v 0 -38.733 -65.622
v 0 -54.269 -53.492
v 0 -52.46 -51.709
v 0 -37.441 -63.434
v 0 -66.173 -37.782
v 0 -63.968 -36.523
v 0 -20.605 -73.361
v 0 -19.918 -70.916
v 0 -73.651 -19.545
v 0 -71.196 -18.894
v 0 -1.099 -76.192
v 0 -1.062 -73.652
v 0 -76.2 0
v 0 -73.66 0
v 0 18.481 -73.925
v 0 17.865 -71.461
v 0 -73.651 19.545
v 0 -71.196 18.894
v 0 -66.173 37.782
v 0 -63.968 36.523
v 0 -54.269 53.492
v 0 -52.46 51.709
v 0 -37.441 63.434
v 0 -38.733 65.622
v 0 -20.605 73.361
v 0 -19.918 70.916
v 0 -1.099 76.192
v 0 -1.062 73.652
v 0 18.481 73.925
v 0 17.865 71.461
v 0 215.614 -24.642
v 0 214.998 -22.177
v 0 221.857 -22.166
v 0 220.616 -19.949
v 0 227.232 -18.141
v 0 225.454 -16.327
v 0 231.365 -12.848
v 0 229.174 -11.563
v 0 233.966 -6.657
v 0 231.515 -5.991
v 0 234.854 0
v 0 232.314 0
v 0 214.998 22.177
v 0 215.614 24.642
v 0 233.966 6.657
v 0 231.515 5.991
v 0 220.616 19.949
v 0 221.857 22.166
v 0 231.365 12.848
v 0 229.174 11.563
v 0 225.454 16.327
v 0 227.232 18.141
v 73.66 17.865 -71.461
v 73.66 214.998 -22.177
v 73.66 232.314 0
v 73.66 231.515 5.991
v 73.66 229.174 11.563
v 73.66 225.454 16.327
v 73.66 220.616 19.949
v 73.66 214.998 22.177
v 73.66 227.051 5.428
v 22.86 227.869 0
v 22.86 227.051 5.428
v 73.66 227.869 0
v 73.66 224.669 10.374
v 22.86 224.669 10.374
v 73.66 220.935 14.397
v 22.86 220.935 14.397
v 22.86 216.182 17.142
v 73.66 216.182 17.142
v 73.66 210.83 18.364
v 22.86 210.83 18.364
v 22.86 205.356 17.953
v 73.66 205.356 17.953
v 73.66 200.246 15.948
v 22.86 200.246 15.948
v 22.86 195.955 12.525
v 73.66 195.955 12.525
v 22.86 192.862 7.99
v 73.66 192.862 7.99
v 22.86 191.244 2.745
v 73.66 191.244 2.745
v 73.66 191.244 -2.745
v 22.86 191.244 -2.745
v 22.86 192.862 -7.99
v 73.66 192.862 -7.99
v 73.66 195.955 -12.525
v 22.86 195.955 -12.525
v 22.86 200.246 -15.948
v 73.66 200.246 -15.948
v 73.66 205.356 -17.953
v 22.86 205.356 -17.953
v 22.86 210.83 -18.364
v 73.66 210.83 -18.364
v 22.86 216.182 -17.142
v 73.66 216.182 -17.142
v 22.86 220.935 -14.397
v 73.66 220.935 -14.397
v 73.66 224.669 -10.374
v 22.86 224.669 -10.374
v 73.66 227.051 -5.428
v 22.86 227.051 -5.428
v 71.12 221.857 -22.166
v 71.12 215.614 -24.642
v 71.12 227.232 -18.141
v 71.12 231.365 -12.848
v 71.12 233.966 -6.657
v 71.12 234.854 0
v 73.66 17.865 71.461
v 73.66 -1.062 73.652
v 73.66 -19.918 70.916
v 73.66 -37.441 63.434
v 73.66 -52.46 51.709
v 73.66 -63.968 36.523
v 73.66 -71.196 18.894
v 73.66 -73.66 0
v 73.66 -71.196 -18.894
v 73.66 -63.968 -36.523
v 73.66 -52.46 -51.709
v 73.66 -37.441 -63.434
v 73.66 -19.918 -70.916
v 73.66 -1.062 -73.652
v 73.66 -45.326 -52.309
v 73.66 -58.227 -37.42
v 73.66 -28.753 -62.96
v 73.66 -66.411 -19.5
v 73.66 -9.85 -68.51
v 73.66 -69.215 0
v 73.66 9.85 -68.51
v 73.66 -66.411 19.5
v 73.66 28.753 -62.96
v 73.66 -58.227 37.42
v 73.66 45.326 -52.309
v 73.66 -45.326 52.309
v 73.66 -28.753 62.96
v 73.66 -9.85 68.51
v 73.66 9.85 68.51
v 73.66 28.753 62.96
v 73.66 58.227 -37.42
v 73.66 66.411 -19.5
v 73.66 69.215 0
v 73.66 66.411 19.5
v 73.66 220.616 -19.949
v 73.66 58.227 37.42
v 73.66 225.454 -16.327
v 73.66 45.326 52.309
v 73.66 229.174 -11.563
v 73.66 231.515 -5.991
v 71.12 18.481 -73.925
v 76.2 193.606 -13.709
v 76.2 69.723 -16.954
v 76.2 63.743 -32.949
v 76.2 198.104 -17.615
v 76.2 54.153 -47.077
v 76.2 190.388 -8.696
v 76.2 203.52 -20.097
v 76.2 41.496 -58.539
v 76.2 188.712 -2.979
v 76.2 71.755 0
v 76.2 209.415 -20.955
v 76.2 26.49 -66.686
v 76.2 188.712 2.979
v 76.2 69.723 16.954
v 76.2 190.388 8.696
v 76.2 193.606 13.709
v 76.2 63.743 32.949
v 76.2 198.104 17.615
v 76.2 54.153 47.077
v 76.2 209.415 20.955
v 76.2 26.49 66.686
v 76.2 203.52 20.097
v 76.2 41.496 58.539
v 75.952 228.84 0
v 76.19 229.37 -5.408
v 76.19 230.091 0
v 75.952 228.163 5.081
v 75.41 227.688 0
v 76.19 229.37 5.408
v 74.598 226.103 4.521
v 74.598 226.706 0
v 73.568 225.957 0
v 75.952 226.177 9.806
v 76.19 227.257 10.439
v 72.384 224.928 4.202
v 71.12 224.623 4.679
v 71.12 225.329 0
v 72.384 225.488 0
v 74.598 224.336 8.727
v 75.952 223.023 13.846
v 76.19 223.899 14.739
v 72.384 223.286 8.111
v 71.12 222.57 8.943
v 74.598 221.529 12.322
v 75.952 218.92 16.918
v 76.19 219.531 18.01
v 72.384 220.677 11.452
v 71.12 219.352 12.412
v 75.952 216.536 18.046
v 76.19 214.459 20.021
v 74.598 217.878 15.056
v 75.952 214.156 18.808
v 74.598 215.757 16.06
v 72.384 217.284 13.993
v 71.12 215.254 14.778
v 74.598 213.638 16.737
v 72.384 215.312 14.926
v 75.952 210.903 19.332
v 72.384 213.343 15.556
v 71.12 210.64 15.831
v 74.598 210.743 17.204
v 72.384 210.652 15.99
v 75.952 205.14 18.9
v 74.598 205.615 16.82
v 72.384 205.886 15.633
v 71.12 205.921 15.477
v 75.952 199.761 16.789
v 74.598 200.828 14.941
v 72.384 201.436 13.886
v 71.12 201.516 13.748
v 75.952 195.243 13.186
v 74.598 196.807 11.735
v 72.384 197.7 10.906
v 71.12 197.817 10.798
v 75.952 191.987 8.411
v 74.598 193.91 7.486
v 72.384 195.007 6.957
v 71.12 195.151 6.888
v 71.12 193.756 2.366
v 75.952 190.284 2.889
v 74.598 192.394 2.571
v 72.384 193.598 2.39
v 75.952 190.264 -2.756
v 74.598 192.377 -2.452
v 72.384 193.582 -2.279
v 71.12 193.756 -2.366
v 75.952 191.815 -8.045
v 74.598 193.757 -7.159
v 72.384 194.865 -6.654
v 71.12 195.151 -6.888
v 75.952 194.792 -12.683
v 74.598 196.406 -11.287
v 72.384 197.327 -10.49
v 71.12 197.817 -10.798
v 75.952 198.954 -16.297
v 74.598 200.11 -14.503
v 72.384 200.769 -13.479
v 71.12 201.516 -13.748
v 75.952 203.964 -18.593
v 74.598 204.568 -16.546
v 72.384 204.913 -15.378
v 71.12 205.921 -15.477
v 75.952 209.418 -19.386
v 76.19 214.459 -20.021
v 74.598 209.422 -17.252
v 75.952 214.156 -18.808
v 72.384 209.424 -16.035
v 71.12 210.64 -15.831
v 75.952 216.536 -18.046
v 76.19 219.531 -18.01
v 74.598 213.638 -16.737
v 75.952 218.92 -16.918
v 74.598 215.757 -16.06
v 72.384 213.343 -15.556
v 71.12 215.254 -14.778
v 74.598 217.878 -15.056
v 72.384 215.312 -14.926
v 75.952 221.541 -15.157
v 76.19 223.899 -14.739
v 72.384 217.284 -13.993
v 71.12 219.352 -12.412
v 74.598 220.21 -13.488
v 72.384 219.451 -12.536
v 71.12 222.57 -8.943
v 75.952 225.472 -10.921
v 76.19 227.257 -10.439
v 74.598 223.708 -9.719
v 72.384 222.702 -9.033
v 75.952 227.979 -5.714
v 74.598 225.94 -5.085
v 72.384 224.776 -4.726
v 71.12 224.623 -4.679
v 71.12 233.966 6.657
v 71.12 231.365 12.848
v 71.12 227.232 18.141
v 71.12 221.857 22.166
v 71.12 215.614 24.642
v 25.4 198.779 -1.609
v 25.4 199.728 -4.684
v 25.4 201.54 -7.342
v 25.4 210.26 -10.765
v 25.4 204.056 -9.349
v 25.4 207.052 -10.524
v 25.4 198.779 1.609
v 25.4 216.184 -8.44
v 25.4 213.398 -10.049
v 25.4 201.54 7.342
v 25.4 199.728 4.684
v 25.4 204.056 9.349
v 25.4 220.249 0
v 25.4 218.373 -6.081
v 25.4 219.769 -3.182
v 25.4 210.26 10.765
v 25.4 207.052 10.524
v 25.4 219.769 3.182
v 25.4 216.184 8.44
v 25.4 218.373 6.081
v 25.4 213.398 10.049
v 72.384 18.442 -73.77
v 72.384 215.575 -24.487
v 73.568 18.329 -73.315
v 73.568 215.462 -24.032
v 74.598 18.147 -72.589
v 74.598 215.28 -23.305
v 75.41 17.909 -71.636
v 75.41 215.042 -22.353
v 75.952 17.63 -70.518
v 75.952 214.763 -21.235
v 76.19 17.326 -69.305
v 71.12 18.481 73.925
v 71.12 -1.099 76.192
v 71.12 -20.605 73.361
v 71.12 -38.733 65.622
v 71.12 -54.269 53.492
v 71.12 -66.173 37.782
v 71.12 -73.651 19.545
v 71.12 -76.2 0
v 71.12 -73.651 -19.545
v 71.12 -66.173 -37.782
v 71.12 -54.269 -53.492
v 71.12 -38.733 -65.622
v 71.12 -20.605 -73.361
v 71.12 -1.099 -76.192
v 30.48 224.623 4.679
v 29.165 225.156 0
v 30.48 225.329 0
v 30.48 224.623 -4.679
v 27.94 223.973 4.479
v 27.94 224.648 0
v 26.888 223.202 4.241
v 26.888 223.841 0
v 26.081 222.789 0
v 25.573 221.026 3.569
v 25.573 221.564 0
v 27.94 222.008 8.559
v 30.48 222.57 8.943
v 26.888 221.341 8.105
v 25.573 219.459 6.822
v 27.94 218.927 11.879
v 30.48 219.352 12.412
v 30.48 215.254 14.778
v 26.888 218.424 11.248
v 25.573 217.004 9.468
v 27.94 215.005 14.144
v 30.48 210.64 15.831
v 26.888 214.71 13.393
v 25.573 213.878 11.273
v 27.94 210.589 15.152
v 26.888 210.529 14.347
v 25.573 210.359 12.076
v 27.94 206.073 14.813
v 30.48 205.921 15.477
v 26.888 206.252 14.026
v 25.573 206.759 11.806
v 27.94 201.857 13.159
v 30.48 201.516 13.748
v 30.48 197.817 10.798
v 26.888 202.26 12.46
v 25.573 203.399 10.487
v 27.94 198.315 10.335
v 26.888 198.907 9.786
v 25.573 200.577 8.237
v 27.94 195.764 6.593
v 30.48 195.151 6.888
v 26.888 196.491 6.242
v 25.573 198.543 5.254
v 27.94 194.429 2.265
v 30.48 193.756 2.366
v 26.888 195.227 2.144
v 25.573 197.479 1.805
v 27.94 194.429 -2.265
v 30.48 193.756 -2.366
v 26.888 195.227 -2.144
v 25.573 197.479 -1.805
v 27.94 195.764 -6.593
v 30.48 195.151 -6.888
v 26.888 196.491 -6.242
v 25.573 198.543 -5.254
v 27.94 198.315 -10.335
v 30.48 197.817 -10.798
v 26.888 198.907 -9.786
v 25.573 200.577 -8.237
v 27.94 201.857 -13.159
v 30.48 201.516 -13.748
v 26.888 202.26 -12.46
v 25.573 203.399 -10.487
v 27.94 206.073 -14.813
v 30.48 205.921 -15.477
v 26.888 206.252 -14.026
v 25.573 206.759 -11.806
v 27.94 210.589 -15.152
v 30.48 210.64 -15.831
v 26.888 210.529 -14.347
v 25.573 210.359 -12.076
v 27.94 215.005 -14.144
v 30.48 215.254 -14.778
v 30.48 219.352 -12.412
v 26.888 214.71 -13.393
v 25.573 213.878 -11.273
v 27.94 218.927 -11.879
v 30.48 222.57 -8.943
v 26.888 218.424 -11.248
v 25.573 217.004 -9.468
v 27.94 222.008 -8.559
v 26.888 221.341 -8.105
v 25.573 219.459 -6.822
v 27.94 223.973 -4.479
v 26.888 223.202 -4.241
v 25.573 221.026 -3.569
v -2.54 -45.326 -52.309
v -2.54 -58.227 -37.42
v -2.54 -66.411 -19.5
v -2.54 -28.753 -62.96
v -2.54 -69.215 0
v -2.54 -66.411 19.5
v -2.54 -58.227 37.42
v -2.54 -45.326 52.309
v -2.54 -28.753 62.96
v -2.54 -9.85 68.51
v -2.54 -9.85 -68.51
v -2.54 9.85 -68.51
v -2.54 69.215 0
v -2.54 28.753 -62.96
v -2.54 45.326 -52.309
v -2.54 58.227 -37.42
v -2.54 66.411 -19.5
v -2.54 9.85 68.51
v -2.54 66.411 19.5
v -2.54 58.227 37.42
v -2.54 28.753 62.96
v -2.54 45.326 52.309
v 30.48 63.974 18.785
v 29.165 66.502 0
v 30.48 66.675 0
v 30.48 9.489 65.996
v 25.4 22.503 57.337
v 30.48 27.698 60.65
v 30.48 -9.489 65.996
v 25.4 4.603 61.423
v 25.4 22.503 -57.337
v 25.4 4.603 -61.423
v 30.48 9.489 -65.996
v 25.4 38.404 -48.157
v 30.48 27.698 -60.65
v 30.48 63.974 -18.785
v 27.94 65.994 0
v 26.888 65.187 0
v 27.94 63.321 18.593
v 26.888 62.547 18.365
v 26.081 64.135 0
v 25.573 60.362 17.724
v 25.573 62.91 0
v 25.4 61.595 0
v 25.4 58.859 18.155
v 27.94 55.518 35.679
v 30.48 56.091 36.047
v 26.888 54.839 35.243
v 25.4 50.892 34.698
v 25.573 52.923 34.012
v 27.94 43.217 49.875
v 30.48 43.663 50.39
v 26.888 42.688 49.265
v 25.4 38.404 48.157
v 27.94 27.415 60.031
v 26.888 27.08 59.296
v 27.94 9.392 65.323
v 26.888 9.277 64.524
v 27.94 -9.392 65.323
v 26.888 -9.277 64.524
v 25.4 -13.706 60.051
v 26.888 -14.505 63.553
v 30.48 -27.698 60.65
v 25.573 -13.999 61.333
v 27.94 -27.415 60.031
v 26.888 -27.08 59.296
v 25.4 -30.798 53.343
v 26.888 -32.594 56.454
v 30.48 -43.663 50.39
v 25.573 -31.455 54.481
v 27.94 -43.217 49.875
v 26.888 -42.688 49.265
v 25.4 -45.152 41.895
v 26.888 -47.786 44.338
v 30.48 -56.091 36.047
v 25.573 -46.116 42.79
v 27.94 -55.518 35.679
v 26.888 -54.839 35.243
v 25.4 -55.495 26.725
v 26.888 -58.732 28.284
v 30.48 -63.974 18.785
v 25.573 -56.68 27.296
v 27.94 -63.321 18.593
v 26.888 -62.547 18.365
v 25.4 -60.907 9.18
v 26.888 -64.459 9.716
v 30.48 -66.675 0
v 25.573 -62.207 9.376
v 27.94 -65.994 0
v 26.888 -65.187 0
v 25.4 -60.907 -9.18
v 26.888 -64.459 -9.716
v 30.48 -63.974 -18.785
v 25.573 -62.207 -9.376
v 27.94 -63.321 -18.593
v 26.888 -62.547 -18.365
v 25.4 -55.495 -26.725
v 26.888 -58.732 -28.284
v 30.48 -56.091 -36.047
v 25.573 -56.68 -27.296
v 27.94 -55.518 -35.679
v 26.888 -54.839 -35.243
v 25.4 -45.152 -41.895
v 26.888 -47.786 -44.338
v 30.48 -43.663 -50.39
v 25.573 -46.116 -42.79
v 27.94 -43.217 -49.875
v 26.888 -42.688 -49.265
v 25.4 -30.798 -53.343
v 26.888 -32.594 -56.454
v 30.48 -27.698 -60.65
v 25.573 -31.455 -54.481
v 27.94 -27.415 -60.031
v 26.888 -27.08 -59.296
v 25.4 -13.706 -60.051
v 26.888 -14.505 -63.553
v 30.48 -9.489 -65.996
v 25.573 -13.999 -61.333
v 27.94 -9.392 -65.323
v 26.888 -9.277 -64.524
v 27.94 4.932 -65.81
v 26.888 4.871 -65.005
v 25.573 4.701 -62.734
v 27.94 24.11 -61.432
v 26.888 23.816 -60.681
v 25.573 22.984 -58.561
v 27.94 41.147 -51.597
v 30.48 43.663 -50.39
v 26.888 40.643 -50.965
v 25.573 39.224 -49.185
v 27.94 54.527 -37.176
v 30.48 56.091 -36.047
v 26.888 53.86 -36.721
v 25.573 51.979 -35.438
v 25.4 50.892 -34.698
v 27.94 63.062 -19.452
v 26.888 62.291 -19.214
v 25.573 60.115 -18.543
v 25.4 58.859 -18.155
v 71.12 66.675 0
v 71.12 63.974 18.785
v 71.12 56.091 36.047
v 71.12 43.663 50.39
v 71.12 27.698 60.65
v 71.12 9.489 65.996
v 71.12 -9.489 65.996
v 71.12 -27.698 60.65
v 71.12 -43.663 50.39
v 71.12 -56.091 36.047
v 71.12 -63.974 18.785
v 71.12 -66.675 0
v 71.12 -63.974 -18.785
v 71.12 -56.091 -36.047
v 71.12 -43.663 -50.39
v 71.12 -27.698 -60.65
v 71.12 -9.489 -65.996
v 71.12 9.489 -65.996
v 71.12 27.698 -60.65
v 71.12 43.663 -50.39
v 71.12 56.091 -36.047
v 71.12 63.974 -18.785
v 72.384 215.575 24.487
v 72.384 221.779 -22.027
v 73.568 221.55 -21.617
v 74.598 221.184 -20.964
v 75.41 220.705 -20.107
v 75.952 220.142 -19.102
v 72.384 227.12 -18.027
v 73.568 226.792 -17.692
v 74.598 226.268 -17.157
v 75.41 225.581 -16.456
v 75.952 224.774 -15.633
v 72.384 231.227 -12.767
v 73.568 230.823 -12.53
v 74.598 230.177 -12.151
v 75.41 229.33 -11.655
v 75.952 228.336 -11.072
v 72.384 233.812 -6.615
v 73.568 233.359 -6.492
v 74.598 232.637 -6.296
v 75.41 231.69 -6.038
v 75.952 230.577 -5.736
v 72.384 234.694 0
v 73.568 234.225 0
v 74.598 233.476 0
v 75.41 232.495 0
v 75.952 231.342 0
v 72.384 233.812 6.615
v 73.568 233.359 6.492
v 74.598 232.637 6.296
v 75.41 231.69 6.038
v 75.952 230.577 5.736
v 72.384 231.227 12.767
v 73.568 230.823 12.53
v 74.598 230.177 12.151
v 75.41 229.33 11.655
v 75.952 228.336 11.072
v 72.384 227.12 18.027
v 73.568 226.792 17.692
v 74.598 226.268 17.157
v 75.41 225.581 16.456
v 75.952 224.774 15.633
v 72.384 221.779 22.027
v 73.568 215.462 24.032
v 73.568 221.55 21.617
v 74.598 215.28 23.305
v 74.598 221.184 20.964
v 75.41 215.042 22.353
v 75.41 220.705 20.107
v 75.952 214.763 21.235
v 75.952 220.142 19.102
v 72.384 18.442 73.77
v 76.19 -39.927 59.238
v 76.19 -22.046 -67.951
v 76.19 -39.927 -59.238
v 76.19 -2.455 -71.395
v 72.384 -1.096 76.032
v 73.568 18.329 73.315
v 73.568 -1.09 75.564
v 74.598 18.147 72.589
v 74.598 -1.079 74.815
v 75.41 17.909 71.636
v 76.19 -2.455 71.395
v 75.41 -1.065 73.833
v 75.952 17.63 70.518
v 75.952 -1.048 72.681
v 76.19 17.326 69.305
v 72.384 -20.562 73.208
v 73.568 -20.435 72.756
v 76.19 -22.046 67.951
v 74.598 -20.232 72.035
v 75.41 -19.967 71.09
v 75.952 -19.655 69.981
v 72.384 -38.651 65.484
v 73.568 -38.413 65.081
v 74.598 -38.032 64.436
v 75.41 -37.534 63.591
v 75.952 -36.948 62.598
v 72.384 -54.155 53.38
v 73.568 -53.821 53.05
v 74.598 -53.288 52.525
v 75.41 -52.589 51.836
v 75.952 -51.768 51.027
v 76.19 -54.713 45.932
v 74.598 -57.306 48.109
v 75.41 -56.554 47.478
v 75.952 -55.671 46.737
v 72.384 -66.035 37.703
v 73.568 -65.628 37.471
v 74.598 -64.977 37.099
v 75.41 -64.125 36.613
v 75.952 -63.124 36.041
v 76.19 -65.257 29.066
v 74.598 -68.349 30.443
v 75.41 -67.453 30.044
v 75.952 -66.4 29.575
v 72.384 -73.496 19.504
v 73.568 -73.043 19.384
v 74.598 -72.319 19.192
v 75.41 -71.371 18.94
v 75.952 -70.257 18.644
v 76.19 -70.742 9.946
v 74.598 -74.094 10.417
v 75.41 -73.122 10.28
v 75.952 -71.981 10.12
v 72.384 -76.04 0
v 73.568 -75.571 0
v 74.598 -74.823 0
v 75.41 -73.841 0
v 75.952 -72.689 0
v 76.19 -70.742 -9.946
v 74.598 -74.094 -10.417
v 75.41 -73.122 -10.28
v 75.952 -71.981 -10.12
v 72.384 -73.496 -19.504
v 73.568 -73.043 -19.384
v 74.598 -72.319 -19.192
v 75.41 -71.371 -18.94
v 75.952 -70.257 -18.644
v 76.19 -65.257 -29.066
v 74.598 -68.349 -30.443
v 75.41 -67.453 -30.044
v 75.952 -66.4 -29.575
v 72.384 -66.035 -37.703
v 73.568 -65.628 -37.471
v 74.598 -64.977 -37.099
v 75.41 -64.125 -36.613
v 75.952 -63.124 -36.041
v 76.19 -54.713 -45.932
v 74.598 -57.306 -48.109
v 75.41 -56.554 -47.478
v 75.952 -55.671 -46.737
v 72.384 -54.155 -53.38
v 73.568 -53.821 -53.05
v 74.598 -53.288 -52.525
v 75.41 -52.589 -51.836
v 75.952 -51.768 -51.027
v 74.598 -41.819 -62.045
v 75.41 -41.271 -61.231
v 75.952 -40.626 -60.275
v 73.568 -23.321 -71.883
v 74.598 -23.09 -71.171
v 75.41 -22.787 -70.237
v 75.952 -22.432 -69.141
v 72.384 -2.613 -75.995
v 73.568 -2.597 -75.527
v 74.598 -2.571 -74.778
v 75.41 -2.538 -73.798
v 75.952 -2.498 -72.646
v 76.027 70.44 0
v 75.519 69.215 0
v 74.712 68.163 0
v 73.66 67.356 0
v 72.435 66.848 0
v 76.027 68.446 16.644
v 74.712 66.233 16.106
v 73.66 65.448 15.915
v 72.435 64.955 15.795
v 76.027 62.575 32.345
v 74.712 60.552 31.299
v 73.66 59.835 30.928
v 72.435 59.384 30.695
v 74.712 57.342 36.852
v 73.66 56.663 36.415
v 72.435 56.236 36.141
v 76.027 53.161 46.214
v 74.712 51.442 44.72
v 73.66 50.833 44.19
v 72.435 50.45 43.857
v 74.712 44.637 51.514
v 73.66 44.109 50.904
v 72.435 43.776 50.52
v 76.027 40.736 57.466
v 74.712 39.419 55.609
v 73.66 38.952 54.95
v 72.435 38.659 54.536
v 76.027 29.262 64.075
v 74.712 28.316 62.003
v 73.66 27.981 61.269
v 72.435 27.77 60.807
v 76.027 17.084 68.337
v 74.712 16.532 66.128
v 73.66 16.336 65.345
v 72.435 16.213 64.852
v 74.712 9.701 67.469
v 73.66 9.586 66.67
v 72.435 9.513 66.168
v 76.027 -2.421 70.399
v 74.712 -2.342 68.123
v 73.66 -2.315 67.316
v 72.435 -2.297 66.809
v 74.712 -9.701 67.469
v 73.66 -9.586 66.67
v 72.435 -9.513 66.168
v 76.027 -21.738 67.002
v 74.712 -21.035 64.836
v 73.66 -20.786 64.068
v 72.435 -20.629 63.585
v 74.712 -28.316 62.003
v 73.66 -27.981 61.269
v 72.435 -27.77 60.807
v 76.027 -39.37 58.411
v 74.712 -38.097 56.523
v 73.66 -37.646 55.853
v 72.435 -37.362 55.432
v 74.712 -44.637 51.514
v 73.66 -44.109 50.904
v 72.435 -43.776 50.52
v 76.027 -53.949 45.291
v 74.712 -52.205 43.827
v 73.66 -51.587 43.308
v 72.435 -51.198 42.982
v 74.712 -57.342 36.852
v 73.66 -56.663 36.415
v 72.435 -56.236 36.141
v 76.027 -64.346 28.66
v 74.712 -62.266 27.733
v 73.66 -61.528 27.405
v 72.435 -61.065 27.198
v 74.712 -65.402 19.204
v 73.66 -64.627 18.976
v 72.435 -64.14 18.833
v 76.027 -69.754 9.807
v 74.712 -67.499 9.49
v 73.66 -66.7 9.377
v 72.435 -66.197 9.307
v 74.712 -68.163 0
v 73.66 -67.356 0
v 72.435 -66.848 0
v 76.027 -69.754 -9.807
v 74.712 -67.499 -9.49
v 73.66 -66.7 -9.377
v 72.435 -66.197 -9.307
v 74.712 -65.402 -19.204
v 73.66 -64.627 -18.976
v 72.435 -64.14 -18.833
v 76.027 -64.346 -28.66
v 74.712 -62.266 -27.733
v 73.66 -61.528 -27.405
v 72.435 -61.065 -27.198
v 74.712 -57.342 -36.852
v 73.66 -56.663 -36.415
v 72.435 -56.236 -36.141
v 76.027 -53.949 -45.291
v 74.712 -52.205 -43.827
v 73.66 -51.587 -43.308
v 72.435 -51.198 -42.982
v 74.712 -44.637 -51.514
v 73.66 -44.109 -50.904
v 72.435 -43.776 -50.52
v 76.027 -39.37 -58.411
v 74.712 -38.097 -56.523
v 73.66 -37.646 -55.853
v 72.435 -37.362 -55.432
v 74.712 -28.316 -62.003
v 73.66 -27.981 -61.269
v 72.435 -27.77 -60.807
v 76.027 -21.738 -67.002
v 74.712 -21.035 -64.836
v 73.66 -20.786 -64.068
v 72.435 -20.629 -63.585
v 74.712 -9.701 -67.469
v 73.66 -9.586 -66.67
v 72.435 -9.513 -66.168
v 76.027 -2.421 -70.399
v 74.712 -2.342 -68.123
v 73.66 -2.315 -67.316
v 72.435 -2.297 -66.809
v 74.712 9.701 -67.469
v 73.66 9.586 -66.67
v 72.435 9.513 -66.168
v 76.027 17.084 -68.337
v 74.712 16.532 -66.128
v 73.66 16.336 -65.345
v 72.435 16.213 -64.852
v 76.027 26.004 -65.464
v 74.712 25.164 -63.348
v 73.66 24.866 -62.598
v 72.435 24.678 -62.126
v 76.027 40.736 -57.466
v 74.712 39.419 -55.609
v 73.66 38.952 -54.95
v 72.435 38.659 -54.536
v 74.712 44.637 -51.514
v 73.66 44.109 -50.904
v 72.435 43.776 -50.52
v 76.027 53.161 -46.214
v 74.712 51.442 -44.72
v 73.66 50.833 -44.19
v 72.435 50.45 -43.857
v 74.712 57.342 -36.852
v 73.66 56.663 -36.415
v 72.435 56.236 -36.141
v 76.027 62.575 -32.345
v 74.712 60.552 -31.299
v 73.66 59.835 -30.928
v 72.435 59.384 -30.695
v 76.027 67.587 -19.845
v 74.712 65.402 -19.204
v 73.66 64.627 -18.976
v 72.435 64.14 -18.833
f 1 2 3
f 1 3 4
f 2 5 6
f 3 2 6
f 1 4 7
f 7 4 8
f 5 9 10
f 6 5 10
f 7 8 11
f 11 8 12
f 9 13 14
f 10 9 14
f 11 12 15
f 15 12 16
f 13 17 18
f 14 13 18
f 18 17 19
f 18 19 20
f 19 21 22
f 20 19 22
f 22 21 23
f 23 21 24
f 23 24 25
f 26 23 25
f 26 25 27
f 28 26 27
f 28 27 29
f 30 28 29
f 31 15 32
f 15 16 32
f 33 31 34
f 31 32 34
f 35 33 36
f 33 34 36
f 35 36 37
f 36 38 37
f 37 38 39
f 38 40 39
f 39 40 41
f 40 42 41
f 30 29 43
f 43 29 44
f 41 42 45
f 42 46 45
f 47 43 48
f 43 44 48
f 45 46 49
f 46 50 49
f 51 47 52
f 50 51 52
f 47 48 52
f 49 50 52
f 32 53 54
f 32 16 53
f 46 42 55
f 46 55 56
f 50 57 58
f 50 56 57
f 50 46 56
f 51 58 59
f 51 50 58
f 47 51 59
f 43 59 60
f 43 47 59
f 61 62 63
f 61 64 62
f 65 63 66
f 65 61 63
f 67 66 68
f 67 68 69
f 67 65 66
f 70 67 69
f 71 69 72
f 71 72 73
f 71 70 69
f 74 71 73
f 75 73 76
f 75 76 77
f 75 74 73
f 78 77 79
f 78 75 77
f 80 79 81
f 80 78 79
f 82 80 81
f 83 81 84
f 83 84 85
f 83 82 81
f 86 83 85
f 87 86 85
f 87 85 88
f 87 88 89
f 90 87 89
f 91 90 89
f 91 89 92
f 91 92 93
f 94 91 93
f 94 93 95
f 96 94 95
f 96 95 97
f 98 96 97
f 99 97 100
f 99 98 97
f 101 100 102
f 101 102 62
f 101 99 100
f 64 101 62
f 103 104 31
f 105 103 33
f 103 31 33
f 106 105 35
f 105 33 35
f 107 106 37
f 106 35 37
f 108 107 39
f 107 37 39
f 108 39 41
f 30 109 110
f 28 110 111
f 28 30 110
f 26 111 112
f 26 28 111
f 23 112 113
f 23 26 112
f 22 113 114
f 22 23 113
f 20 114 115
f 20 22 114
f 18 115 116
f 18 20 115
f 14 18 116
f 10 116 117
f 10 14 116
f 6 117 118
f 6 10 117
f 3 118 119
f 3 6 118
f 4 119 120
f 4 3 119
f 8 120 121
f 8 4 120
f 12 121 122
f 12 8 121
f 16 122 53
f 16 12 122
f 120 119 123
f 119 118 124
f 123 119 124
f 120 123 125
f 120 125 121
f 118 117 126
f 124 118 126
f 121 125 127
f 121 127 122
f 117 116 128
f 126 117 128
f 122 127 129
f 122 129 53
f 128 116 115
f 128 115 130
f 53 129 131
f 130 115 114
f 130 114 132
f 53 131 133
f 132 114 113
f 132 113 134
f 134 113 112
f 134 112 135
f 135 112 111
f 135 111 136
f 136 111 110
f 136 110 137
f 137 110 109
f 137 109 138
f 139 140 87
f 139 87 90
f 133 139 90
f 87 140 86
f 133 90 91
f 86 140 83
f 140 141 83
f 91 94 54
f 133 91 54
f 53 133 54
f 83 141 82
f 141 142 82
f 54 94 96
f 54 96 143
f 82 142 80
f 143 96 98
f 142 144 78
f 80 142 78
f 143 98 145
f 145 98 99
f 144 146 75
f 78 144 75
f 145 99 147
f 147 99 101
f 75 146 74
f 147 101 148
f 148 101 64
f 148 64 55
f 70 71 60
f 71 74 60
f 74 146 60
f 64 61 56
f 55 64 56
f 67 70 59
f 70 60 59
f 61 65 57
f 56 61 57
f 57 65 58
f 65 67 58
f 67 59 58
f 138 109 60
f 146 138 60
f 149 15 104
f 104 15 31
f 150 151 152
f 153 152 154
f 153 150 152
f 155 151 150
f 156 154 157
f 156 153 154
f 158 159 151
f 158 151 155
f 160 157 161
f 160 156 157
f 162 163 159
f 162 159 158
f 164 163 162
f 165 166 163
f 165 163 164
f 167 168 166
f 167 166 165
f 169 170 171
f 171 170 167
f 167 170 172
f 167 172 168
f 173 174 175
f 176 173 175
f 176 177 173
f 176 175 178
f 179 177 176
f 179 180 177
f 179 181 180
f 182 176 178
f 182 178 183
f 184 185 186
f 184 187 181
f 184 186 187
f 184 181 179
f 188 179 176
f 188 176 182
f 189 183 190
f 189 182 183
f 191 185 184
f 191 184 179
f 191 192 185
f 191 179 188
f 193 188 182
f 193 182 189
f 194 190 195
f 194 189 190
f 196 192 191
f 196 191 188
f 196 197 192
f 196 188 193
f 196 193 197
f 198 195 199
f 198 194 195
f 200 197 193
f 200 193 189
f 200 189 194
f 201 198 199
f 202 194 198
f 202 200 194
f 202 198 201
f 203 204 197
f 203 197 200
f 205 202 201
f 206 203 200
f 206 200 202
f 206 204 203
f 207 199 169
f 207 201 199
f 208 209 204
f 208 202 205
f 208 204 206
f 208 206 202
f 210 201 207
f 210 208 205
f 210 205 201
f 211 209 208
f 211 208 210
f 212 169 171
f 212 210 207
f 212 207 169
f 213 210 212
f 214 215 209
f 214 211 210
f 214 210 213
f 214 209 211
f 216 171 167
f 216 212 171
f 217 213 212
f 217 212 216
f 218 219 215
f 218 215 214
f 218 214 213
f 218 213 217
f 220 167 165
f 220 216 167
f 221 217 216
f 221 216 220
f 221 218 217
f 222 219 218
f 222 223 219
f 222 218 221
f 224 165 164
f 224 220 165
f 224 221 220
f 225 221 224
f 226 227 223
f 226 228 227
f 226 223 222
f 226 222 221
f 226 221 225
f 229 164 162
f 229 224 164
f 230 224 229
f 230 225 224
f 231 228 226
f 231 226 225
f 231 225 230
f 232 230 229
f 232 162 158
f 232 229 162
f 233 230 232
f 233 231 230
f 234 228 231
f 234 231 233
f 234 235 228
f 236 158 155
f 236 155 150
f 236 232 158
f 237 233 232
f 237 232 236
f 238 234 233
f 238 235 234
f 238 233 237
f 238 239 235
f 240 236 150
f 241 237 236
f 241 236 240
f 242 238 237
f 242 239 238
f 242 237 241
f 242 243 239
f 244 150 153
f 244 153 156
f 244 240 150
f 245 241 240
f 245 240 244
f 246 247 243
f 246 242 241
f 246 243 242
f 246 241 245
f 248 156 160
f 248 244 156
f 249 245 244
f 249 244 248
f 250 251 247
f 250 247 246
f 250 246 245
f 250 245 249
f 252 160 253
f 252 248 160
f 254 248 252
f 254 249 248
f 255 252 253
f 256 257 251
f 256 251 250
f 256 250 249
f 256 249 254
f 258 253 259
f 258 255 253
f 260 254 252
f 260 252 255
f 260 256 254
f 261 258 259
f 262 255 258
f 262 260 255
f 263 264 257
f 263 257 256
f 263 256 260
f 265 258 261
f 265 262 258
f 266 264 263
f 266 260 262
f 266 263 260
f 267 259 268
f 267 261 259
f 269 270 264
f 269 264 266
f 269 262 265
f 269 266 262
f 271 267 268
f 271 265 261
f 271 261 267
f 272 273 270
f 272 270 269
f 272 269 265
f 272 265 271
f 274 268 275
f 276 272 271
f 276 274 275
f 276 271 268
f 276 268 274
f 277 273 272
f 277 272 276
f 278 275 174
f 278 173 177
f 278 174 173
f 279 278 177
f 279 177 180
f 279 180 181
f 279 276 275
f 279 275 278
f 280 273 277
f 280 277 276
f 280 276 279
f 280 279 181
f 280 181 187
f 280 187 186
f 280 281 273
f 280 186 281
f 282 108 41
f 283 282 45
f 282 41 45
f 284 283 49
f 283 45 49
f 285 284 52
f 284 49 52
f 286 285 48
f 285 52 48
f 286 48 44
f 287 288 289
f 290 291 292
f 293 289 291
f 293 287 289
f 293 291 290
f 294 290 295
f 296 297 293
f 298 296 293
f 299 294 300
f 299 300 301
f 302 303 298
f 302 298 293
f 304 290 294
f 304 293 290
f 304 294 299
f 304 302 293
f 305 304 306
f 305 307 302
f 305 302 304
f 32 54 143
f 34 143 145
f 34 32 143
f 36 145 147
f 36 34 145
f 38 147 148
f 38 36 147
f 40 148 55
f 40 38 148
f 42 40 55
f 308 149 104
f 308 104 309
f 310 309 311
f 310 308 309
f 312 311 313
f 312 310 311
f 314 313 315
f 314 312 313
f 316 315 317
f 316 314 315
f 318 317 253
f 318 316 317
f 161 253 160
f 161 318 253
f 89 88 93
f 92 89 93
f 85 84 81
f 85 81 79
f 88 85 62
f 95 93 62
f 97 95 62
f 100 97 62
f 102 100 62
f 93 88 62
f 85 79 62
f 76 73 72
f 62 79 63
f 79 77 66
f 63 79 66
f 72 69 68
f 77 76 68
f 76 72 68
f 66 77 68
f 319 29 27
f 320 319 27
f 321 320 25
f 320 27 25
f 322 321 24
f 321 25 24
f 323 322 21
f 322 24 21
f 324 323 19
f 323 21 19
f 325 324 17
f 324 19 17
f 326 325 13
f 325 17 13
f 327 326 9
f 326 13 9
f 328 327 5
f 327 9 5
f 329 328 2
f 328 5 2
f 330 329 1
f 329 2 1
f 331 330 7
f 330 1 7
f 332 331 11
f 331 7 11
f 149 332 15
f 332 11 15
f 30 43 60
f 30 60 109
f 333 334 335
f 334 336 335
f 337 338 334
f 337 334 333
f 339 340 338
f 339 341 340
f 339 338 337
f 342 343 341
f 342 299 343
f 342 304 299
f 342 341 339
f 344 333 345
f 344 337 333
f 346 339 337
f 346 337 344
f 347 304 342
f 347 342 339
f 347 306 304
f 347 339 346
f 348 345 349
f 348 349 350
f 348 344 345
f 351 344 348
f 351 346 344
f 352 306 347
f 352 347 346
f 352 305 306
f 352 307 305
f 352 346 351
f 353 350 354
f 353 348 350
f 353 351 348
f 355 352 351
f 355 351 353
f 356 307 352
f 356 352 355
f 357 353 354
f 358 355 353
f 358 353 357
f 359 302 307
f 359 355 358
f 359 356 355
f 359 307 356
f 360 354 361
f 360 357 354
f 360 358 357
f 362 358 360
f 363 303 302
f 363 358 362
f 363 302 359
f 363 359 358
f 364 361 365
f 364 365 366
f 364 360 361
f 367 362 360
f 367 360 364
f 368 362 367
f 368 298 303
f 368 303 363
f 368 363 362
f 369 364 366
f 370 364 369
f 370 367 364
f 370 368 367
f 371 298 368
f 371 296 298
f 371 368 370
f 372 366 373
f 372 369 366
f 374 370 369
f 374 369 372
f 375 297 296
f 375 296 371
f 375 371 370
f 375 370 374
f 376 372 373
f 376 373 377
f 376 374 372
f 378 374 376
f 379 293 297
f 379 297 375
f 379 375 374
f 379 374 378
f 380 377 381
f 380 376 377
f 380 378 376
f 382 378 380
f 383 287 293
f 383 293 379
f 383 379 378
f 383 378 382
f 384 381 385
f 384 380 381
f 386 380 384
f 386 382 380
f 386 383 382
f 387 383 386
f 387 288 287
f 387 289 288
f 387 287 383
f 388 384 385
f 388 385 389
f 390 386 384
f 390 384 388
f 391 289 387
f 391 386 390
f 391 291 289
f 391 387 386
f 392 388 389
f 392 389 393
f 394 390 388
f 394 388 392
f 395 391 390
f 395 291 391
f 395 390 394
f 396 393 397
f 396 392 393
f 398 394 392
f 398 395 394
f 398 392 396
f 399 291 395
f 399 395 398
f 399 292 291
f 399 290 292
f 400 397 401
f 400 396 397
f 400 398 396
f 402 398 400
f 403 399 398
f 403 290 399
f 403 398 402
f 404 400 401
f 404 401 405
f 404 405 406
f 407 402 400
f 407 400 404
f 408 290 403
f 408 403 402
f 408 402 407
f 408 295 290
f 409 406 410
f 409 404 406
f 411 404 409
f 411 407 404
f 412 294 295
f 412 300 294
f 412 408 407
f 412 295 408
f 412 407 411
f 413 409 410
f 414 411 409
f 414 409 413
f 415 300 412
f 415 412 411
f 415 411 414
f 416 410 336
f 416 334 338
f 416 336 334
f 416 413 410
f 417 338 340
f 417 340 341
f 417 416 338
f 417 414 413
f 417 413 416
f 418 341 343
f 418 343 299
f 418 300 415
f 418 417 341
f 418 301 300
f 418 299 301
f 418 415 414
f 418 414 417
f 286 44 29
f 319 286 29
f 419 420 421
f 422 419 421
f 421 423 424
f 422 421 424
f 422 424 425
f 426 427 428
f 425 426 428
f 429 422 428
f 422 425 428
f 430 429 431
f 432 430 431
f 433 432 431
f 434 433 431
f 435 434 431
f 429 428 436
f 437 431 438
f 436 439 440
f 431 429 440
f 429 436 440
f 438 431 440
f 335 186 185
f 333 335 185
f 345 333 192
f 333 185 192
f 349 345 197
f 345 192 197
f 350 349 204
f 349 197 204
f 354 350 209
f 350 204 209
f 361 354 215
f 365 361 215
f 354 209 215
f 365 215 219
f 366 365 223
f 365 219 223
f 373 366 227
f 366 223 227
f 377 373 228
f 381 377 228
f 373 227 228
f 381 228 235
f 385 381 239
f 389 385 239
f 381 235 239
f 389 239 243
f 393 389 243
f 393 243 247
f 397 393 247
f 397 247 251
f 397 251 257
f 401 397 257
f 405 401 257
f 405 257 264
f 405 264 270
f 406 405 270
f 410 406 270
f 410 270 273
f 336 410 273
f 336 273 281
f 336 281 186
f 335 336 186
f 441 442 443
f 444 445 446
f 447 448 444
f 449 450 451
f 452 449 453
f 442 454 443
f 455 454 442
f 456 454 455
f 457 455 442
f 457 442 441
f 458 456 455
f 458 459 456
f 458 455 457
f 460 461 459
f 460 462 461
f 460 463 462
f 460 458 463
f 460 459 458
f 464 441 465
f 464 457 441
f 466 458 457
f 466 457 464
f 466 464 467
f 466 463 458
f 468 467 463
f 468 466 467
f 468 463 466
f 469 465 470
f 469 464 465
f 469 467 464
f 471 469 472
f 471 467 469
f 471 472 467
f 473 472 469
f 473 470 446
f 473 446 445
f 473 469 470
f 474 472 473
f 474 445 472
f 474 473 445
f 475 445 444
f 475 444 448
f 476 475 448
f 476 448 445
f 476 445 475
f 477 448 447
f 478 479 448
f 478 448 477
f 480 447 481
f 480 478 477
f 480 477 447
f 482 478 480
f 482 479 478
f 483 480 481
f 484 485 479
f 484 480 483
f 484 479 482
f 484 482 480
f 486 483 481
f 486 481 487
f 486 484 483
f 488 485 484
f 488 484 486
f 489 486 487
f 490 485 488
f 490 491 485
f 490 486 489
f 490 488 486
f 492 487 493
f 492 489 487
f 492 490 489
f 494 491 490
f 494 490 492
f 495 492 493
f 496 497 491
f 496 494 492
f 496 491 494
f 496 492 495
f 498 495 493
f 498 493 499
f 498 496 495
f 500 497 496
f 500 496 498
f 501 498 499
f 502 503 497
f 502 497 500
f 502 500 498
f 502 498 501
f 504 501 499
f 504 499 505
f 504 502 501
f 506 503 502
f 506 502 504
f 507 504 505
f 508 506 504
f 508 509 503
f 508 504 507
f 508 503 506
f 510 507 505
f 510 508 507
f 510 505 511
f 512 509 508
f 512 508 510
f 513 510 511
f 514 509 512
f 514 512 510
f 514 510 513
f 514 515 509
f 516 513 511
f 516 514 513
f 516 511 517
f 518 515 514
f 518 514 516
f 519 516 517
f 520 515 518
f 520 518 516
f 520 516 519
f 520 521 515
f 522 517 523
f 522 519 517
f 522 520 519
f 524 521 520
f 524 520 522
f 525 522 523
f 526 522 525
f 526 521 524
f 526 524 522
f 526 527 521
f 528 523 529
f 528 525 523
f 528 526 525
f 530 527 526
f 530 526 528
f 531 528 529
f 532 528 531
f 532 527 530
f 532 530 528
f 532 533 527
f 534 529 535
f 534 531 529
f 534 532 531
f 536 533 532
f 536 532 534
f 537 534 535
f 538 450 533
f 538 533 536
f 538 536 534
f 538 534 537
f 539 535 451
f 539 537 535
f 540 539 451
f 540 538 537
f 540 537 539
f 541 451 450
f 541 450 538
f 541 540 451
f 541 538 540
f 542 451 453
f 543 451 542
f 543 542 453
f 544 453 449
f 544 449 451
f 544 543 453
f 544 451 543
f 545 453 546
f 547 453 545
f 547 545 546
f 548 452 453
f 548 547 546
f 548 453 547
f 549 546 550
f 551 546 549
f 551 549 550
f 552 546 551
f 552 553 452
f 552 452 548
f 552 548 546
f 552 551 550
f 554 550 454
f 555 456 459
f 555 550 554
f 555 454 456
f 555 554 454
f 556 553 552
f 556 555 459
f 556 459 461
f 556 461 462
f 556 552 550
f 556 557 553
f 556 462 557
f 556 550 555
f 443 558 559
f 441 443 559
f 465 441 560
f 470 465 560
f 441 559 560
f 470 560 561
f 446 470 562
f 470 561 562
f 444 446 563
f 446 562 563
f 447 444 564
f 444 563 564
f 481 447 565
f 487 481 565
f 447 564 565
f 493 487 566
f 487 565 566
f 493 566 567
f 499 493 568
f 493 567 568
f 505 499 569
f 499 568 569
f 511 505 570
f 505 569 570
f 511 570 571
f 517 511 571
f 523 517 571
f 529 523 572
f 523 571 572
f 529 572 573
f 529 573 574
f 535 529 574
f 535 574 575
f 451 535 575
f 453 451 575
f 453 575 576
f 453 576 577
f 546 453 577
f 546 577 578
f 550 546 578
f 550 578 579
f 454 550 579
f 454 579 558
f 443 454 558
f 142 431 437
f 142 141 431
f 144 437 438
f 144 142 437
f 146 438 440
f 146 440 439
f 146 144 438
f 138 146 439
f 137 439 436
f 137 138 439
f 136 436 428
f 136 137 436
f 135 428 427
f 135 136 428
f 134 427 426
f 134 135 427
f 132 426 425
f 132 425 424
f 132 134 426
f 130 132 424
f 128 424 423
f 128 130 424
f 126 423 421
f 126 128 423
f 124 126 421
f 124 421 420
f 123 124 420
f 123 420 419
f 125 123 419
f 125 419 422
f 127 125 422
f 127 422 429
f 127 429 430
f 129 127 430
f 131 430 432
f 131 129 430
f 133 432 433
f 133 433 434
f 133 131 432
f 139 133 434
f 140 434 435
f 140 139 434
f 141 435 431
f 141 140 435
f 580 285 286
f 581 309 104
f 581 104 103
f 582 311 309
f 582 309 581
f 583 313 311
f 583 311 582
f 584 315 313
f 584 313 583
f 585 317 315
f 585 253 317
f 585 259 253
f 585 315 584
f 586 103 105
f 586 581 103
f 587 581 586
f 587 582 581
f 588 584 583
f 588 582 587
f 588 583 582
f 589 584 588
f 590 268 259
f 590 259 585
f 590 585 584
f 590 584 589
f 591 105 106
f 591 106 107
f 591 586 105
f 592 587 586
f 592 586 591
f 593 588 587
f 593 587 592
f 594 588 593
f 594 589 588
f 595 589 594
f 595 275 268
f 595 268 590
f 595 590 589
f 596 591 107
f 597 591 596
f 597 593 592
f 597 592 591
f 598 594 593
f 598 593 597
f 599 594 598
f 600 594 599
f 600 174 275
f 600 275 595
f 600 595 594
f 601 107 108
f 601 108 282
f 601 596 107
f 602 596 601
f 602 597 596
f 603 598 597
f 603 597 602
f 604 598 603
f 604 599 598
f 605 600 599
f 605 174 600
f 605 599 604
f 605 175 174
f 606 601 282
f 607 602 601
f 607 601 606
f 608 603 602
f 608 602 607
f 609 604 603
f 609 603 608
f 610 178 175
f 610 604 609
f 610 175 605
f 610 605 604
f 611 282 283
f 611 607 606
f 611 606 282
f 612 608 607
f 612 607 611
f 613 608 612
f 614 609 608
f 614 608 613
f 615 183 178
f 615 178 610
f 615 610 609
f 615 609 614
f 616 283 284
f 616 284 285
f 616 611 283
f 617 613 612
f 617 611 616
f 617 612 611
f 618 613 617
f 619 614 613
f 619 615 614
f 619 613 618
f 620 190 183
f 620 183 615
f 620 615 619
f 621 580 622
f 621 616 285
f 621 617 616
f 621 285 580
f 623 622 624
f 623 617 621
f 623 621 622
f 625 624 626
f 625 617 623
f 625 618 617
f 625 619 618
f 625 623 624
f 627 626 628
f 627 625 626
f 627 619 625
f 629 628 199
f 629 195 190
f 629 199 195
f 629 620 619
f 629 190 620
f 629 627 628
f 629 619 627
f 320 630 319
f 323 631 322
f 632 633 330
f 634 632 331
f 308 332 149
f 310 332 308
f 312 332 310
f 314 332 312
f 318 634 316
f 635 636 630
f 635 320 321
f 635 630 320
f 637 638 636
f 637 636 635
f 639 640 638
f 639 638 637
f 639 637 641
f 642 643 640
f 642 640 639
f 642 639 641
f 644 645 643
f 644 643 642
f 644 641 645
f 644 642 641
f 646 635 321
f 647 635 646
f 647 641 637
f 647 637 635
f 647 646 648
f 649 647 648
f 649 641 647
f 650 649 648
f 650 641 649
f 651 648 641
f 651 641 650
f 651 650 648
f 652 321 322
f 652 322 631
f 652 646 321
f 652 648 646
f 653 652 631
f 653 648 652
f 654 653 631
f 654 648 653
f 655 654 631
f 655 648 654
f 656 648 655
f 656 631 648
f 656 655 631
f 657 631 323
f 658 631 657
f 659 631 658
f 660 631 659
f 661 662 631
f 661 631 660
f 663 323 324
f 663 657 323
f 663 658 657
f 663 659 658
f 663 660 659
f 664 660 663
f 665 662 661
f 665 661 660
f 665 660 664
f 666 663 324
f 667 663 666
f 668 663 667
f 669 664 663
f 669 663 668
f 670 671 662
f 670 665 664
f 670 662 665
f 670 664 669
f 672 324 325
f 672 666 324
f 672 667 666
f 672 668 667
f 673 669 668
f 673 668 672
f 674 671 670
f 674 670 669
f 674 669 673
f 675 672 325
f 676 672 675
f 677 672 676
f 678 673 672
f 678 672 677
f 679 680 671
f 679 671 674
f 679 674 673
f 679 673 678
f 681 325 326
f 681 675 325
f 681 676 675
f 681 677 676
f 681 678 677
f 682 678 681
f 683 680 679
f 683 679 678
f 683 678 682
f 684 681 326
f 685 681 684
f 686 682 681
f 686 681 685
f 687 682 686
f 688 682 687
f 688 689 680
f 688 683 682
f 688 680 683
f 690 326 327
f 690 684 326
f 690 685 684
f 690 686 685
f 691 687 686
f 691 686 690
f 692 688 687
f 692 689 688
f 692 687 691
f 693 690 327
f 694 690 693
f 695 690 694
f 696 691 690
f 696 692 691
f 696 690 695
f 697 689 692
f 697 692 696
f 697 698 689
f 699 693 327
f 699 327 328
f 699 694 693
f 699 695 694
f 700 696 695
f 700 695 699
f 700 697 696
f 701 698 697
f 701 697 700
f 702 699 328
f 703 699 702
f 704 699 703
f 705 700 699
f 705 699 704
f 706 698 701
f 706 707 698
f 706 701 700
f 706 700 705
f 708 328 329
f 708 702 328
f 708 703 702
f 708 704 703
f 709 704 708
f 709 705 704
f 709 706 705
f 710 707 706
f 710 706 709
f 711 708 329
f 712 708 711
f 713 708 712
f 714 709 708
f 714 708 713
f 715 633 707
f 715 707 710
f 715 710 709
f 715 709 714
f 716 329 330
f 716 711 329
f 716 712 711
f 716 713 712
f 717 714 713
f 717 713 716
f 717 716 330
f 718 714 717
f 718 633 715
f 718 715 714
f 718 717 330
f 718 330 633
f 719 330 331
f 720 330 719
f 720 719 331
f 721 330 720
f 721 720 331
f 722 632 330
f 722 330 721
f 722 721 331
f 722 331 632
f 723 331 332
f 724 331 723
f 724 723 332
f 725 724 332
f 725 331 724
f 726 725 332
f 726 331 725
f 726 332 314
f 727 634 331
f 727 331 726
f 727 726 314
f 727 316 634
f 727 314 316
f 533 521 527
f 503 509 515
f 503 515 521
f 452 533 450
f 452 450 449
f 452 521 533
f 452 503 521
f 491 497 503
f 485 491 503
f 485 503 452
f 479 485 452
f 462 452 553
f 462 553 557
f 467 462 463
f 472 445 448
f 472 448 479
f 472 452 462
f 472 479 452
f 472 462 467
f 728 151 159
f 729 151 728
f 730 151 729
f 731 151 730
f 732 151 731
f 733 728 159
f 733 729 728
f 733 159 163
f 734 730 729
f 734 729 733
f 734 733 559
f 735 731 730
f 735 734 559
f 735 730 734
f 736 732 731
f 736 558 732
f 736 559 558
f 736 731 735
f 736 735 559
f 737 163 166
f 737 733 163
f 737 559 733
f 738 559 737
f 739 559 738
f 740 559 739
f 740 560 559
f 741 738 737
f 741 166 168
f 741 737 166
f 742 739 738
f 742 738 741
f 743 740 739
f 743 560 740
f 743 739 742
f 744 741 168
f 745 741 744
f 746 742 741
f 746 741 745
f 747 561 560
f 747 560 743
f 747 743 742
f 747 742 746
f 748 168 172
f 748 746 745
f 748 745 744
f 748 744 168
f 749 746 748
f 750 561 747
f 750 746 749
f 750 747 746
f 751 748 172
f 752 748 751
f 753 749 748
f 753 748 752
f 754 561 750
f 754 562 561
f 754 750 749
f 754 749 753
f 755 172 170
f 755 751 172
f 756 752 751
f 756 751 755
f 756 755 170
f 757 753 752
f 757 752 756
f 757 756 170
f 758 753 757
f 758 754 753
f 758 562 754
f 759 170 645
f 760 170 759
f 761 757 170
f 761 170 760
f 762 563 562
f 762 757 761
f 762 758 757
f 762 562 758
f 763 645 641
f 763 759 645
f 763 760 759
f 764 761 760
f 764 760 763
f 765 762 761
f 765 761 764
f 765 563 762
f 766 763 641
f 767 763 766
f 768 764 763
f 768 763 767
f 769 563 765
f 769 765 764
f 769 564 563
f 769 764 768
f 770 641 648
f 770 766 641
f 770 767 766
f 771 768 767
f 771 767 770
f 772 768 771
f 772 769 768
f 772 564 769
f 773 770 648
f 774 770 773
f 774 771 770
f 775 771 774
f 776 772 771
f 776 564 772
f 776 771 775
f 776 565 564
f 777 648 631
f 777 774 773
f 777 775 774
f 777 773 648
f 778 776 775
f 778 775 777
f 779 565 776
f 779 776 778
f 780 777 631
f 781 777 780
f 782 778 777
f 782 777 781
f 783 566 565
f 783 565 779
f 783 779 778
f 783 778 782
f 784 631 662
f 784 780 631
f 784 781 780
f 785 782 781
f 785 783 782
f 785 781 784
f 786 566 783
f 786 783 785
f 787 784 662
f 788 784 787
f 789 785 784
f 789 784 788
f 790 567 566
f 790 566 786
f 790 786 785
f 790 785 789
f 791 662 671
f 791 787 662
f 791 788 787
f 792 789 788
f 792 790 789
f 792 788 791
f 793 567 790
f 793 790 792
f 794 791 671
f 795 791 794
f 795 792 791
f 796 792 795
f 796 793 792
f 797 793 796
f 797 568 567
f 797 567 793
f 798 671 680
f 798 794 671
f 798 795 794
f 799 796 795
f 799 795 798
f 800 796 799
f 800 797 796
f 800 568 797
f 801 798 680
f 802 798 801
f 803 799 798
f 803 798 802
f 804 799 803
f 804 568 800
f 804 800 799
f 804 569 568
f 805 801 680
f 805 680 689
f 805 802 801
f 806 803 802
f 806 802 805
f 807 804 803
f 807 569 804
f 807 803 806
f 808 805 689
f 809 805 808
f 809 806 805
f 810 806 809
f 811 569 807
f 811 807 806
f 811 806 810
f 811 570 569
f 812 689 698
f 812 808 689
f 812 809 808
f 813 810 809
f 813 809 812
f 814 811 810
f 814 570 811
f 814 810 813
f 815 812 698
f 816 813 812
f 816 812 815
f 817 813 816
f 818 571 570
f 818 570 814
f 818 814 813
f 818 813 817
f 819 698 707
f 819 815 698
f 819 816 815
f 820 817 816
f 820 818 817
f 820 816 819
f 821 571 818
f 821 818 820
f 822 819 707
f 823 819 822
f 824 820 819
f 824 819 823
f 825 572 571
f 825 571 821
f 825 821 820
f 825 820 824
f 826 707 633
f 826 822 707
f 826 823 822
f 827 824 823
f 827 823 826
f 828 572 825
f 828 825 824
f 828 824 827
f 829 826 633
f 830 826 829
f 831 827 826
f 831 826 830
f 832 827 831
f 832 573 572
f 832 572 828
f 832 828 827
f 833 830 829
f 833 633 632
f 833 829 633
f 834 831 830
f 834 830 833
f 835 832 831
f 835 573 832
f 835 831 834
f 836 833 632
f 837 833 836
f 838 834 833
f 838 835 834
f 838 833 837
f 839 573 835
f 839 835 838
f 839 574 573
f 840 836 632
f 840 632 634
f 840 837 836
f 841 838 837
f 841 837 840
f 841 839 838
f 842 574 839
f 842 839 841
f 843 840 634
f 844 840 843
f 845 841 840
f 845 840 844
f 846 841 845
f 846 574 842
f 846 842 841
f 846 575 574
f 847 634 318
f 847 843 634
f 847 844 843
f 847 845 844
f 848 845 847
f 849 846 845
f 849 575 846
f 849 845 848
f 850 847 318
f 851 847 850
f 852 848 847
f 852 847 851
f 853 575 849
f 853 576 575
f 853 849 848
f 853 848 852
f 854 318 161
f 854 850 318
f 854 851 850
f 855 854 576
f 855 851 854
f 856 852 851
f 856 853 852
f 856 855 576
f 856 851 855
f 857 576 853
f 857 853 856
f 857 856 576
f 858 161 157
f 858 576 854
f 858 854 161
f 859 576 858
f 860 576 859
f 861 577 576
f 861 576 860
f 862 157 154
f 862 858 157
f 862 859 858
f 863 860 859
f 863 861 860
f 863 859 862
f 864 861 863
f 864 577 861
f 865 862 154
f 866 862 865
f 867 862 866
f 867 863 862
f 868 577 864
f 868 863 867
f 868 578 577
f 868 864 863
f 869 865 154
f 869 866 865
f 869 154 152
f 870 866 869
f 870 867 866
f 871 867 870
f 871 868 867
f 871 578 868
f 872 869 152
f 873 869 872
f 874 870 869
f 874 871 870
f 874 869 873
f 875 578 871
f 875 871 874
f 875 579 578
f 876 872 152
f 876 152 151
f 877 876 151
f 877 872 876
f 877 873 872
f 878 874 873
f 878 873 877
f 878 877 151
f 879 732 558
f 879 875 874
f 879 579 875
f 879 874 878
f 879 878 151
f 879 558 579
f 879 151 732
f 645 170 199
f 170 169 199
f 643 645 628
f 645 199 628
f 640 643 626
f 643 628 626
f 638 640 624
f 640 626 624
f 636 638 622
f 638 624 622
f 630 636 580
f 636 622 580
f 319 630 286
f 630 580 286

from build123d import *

# Parameters (mm, degrees)
F1_DEPTH    = 76.2
F2_R        = 66.675
F3_DEPTH    = 50.8
F2_R_2      = 15.875
F4_DEPTH    = 50.8
F5_T        = -2.54
F6_T1_DEPTH = 203.2
F6_T3_DEPTH = 203.2
F6_T6_ANGLE = 208.0724869359
F6_T8_ANGLE = 151.9275130641
F7_R        = 5.08
F8_DEPTH    = 25.4


# Not quite as in the source:
# - a fillet or chamfer that OpenCascade refuses, or shapes differently, is made with other operations: its cross-section is extruded or revolved along the edge and cut away or added


with BuildPart() as f1:
    # F0 (on Right) → F1 (new body)
    with BuildSketch(Plane.YZ):
        with BuildLine():
            ThreePointArc((18.4812146278, 73.9248585111), (60.0612543768, 46.8944103565), (76.2, 0))
            ThreePointArc((76.2, 0), (60.0612543768, -46.8944103565), (18.4812146278, -73.9248585111))
            Line((18.4812146278, -73.9248585111), (215.6141706573, -24.6416195037))
            ThreePointArc((215.6141706573, -24.6416195037), (184.0537657814, 0), (215.6141706573, 24.6416195037))
            Line((215.6141706573, 24.6416195037), (18.4812146278, 73.9248585111))
        make_face()
        with BuildLine():
            ThreePointArc((18.4812146278, -73.9248585111), (60.0612543768, -46.8944103565), (76.2, 0))
            ThreePointArc((76.2, 0), (60.0612543768, 46.8944103565), (18.4812146278, 73.9248585111))
            ThreePointArc((18.4812146278, 73.9248585111), (-76.2, 0), (18.4812146278, -73.9248585111))
        make_face()
        with BuildLine():
            ThreePointArc((234.8537657814, 0), (229.474183907, 15.6314701188), (215.6141706573, 24.6416195037))
            ThreePointArc((215.6141706573, 24.6416195037), (184.0537657814, 0), (215.6141706573, -24.6416195037))
            ThreePointArc((215.6141706573, -24.6416195037), (229.474183907, -15.6314701188), (234.8537657814, 0))
        make_face()
    extrude(amount=F1_DEPTH)

    # F2 (on face) → F3 (cut)
    with BuildSketch(Plane.YZ.offset(76.2)):
        Circle(F2_R)
    extrude(amount=-F3_DEPTH, mode=Mode.SUBTRACT)

    # F2 (on face) → F4 (cut)
    with BuildSketch(Plane.YZ.offset(76.2)):
        with Locations((209.4537657814, 0)):
            Circle(F2_R_2)
    extrude(amount=-F4_DEPTH, mode=Mode.SUBTRACT)

    # F5
    f5_openings = [f1.faces().sort_by_distance(p)[0] for p in [
        (0, 57.51924, 0),
    ]]
    offset(amount=F5_T, openings=f5_openings, kind=Kind.INTERSECTION)

    # F6: fillet of radius 5.08 on 6 edges, made by hand

    # F6_s2 → F6_t1 (cut)
    with BuildSketch(Plane(origin=(0, 0, 0), x_dir=(1, 0, 0), z_dir=(0, 0.9701425001, 0.242535625))):
        with BuildLine():
            ThreePointArc((71.12, 76.2), (74.7121024484, 74.7121024484), (76.2, 71.12))
            Line((76.2, 71.12), (76.2, 76.2))
            Line((76.2, 76.2), (71.12, 76.2))
        make_face()
    extrude(amount=F6_T1_DEPTH, mode=Mode.SUBTRACT)

    # F6_s4 → F6_t3 (cut)
    with BuildSketch(Plane(origin=(0, 197.1329560295, -49.2832390074), x_dir=(1, 0, 0), z_dir=(0, -0.9701425001, 0.242535625))):
        with BuildLine():
            ThreePointArc((76.2, 71.12), (74.7121024484, 74.7121024484), (71.12, 76.2))
            Line((71.12, 76.2), (76.2, 76.2))
            Line((76.2, 76.2), (76.2, 71.12))
        make_face()
    extrude(amount=F6_T3_DEPTH, mode=Mode.SUBTRACT)

    # F6_s5 → F6_t6 (revolve, cut)
    with BuildSketch(Plane(origin=(0, 0, 0), x_dir=(1, 0, 0), z_dir=(0, 0.9701425001, -0.242535625))):
        with BuildLine():
            ThreePointArc((71.12, -76.2), (74.7121024484, -74.7121024484), (76.2, -71.12))
            Line((76.2, -71.12), (76.2, -76.2))
            Line((76.2, -76.2), (71.12, -76.2))
        make_face()
    revolve(axis=Axis((76.2, 0, 0), (1, 0, 0)), revolution_arc=F6_T6_ANGLE, mode=Mode.SUBTRACT)

    # F6_s7 → F6_t8 (revolve, cut)
    with BuildSketch(Plane(origin=(0, 197.1329560295, 49.2832390074), x_dir=(1, 0, 0), z_dir=(0, -0.9701425001, -0.242535625))):
        with BuildLine():
            ThreePointArc((71.12, -76.2), (74.7121024484, -74.7121024484), (76.2, -71.12))
            Line((76.2, -71.12), (76.2, -76.2))
            Line((76.2, -76.2), (71.12, -76.2))
        make_face()
    revolve(axis=Axis((76.2, 209.4537657814, 0), (1, 0, 0)), revolution_arc=F6_T8_ANGLE, mode=Mode.SUBTRACT)

    # F6_s9 → F6_t10 (revolve, cut)
    with BuildSketch(Plane.XY):
        with BuildLine():
            ThreePointArc((76.2, 71.755), (74.7121024484, 68.1628975516), (71.12, 66.675))
            Line((71.12, 66.675), (76.2, 66.675))
            Line((76.2, 66.675), (76.2, 71.755))
        make_face()
    revolve(axis=Axis((76.2, 0, 0), (1, 0, 0)), mode=Mode.SUBTRACT)

    # F6_s11 → F6_t12 (revolve, cut)
    with BuildSketch(Plane.XY):
        with BuildLine():
            ThreePointArc((76.2, 230.4087657814), (74.7121024484, 226.8166633329), (71.12, 225.3287657814))
            Line((71.12, 225.3287657814), (76.2, 225.3287657814))
            Line((76.2, 225.3287657814), (76.2, 230.4087657814))
        make_face()
    revolve(axis=Axis((76.2, 209.4537657814, 0), (1, 0, 0)), mode=Mode.SUBTRACT)

    # F7
    f7_edges = [f1.edges().sort_by_distance(p)[0] for p in [
        (25.4, -66.675, 0),
        (25.4, 193.578766, 0),
    ]]
    fillet(f7_edges, radius=F7_R)

    # F8 (add): a face of the model
    f8_faces = [f1.faces().sort_by_distance(p)[0] for p in [
        (22.86, 0, 0),
    ]]
    extrude(f8_faces, amount=F8_DEPTH)


solid = f1.part
